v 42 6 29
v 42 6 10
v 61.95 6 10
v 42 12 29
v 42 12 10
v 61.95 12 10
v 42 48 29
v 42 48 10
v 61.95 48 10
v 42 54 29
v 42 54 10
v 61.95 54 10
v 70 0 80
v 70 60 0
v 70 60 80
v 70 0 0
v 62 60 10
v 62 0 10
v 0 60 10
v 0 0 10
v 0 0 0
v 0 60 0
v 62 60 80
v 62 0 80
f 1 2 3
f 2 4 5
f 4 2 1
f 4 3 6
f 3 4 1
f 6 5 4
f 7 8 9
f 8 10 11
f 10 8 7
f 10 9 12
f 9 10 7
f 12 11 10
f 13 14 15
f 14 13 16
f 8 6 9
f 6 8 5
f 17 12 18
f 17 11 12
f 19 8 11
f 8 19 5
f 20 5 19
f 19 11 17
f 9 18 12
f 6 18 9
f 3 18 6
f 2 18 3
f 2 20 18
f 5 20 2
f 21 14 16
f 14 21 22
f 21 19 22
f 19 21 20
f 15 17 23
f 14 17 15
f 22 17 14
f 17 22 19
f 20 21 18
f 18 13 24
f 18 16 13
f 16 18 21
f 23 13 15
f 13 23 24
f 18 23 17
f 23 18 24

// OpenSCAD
$fn = 32;

// ----------------------------------------------------------------------
// Rib bracket: 2-gusset L bracket
// ----------------------------------------------------------------------

// --- parameters (mm) ---
base_l = 70;              // foot length, X
base_w = 60;              // foot width, Y
base_t = 10;              // foot thickness
plate_t = 8;              // upright plate thickness
plate_h = 80;             // overall height
gus_l = 20;               // gusset leg along the foot
gus_h = 20;               // gusset height
gus_t = 6;                // gusset thickness
gus_edge = 6;             // gusset margin from the foot edge
n_gus = 2;                // gusset count
fit_tol = 0.05;           // tolerance for press fits, mm
free_tol = 0.3;           // tolerance for clearance fits, mm

gus_pitch = (base_w - 2 * gus_edge - gus_t) / (n_gus - 1);  // gusset pitch

union() {
  cube([base_l, base_w, base_t]);
  translate([base_l - plate_t, 0, base_t - 1])
    cube([plate_t, base_w, plate_h - base_t + 1]);
  for (i = [0 : n_gus - 1])
    translate([base_l - plate_t - gus_l, gus_edge + i * gus_pitch, base_t - 1])
      rotate([-90, 0, 0])
        linear_extrude(height = gus_t)
          polygon(points = [[0, 0], [gus_l + 1, 0], [0, -gus_h]]);
}
